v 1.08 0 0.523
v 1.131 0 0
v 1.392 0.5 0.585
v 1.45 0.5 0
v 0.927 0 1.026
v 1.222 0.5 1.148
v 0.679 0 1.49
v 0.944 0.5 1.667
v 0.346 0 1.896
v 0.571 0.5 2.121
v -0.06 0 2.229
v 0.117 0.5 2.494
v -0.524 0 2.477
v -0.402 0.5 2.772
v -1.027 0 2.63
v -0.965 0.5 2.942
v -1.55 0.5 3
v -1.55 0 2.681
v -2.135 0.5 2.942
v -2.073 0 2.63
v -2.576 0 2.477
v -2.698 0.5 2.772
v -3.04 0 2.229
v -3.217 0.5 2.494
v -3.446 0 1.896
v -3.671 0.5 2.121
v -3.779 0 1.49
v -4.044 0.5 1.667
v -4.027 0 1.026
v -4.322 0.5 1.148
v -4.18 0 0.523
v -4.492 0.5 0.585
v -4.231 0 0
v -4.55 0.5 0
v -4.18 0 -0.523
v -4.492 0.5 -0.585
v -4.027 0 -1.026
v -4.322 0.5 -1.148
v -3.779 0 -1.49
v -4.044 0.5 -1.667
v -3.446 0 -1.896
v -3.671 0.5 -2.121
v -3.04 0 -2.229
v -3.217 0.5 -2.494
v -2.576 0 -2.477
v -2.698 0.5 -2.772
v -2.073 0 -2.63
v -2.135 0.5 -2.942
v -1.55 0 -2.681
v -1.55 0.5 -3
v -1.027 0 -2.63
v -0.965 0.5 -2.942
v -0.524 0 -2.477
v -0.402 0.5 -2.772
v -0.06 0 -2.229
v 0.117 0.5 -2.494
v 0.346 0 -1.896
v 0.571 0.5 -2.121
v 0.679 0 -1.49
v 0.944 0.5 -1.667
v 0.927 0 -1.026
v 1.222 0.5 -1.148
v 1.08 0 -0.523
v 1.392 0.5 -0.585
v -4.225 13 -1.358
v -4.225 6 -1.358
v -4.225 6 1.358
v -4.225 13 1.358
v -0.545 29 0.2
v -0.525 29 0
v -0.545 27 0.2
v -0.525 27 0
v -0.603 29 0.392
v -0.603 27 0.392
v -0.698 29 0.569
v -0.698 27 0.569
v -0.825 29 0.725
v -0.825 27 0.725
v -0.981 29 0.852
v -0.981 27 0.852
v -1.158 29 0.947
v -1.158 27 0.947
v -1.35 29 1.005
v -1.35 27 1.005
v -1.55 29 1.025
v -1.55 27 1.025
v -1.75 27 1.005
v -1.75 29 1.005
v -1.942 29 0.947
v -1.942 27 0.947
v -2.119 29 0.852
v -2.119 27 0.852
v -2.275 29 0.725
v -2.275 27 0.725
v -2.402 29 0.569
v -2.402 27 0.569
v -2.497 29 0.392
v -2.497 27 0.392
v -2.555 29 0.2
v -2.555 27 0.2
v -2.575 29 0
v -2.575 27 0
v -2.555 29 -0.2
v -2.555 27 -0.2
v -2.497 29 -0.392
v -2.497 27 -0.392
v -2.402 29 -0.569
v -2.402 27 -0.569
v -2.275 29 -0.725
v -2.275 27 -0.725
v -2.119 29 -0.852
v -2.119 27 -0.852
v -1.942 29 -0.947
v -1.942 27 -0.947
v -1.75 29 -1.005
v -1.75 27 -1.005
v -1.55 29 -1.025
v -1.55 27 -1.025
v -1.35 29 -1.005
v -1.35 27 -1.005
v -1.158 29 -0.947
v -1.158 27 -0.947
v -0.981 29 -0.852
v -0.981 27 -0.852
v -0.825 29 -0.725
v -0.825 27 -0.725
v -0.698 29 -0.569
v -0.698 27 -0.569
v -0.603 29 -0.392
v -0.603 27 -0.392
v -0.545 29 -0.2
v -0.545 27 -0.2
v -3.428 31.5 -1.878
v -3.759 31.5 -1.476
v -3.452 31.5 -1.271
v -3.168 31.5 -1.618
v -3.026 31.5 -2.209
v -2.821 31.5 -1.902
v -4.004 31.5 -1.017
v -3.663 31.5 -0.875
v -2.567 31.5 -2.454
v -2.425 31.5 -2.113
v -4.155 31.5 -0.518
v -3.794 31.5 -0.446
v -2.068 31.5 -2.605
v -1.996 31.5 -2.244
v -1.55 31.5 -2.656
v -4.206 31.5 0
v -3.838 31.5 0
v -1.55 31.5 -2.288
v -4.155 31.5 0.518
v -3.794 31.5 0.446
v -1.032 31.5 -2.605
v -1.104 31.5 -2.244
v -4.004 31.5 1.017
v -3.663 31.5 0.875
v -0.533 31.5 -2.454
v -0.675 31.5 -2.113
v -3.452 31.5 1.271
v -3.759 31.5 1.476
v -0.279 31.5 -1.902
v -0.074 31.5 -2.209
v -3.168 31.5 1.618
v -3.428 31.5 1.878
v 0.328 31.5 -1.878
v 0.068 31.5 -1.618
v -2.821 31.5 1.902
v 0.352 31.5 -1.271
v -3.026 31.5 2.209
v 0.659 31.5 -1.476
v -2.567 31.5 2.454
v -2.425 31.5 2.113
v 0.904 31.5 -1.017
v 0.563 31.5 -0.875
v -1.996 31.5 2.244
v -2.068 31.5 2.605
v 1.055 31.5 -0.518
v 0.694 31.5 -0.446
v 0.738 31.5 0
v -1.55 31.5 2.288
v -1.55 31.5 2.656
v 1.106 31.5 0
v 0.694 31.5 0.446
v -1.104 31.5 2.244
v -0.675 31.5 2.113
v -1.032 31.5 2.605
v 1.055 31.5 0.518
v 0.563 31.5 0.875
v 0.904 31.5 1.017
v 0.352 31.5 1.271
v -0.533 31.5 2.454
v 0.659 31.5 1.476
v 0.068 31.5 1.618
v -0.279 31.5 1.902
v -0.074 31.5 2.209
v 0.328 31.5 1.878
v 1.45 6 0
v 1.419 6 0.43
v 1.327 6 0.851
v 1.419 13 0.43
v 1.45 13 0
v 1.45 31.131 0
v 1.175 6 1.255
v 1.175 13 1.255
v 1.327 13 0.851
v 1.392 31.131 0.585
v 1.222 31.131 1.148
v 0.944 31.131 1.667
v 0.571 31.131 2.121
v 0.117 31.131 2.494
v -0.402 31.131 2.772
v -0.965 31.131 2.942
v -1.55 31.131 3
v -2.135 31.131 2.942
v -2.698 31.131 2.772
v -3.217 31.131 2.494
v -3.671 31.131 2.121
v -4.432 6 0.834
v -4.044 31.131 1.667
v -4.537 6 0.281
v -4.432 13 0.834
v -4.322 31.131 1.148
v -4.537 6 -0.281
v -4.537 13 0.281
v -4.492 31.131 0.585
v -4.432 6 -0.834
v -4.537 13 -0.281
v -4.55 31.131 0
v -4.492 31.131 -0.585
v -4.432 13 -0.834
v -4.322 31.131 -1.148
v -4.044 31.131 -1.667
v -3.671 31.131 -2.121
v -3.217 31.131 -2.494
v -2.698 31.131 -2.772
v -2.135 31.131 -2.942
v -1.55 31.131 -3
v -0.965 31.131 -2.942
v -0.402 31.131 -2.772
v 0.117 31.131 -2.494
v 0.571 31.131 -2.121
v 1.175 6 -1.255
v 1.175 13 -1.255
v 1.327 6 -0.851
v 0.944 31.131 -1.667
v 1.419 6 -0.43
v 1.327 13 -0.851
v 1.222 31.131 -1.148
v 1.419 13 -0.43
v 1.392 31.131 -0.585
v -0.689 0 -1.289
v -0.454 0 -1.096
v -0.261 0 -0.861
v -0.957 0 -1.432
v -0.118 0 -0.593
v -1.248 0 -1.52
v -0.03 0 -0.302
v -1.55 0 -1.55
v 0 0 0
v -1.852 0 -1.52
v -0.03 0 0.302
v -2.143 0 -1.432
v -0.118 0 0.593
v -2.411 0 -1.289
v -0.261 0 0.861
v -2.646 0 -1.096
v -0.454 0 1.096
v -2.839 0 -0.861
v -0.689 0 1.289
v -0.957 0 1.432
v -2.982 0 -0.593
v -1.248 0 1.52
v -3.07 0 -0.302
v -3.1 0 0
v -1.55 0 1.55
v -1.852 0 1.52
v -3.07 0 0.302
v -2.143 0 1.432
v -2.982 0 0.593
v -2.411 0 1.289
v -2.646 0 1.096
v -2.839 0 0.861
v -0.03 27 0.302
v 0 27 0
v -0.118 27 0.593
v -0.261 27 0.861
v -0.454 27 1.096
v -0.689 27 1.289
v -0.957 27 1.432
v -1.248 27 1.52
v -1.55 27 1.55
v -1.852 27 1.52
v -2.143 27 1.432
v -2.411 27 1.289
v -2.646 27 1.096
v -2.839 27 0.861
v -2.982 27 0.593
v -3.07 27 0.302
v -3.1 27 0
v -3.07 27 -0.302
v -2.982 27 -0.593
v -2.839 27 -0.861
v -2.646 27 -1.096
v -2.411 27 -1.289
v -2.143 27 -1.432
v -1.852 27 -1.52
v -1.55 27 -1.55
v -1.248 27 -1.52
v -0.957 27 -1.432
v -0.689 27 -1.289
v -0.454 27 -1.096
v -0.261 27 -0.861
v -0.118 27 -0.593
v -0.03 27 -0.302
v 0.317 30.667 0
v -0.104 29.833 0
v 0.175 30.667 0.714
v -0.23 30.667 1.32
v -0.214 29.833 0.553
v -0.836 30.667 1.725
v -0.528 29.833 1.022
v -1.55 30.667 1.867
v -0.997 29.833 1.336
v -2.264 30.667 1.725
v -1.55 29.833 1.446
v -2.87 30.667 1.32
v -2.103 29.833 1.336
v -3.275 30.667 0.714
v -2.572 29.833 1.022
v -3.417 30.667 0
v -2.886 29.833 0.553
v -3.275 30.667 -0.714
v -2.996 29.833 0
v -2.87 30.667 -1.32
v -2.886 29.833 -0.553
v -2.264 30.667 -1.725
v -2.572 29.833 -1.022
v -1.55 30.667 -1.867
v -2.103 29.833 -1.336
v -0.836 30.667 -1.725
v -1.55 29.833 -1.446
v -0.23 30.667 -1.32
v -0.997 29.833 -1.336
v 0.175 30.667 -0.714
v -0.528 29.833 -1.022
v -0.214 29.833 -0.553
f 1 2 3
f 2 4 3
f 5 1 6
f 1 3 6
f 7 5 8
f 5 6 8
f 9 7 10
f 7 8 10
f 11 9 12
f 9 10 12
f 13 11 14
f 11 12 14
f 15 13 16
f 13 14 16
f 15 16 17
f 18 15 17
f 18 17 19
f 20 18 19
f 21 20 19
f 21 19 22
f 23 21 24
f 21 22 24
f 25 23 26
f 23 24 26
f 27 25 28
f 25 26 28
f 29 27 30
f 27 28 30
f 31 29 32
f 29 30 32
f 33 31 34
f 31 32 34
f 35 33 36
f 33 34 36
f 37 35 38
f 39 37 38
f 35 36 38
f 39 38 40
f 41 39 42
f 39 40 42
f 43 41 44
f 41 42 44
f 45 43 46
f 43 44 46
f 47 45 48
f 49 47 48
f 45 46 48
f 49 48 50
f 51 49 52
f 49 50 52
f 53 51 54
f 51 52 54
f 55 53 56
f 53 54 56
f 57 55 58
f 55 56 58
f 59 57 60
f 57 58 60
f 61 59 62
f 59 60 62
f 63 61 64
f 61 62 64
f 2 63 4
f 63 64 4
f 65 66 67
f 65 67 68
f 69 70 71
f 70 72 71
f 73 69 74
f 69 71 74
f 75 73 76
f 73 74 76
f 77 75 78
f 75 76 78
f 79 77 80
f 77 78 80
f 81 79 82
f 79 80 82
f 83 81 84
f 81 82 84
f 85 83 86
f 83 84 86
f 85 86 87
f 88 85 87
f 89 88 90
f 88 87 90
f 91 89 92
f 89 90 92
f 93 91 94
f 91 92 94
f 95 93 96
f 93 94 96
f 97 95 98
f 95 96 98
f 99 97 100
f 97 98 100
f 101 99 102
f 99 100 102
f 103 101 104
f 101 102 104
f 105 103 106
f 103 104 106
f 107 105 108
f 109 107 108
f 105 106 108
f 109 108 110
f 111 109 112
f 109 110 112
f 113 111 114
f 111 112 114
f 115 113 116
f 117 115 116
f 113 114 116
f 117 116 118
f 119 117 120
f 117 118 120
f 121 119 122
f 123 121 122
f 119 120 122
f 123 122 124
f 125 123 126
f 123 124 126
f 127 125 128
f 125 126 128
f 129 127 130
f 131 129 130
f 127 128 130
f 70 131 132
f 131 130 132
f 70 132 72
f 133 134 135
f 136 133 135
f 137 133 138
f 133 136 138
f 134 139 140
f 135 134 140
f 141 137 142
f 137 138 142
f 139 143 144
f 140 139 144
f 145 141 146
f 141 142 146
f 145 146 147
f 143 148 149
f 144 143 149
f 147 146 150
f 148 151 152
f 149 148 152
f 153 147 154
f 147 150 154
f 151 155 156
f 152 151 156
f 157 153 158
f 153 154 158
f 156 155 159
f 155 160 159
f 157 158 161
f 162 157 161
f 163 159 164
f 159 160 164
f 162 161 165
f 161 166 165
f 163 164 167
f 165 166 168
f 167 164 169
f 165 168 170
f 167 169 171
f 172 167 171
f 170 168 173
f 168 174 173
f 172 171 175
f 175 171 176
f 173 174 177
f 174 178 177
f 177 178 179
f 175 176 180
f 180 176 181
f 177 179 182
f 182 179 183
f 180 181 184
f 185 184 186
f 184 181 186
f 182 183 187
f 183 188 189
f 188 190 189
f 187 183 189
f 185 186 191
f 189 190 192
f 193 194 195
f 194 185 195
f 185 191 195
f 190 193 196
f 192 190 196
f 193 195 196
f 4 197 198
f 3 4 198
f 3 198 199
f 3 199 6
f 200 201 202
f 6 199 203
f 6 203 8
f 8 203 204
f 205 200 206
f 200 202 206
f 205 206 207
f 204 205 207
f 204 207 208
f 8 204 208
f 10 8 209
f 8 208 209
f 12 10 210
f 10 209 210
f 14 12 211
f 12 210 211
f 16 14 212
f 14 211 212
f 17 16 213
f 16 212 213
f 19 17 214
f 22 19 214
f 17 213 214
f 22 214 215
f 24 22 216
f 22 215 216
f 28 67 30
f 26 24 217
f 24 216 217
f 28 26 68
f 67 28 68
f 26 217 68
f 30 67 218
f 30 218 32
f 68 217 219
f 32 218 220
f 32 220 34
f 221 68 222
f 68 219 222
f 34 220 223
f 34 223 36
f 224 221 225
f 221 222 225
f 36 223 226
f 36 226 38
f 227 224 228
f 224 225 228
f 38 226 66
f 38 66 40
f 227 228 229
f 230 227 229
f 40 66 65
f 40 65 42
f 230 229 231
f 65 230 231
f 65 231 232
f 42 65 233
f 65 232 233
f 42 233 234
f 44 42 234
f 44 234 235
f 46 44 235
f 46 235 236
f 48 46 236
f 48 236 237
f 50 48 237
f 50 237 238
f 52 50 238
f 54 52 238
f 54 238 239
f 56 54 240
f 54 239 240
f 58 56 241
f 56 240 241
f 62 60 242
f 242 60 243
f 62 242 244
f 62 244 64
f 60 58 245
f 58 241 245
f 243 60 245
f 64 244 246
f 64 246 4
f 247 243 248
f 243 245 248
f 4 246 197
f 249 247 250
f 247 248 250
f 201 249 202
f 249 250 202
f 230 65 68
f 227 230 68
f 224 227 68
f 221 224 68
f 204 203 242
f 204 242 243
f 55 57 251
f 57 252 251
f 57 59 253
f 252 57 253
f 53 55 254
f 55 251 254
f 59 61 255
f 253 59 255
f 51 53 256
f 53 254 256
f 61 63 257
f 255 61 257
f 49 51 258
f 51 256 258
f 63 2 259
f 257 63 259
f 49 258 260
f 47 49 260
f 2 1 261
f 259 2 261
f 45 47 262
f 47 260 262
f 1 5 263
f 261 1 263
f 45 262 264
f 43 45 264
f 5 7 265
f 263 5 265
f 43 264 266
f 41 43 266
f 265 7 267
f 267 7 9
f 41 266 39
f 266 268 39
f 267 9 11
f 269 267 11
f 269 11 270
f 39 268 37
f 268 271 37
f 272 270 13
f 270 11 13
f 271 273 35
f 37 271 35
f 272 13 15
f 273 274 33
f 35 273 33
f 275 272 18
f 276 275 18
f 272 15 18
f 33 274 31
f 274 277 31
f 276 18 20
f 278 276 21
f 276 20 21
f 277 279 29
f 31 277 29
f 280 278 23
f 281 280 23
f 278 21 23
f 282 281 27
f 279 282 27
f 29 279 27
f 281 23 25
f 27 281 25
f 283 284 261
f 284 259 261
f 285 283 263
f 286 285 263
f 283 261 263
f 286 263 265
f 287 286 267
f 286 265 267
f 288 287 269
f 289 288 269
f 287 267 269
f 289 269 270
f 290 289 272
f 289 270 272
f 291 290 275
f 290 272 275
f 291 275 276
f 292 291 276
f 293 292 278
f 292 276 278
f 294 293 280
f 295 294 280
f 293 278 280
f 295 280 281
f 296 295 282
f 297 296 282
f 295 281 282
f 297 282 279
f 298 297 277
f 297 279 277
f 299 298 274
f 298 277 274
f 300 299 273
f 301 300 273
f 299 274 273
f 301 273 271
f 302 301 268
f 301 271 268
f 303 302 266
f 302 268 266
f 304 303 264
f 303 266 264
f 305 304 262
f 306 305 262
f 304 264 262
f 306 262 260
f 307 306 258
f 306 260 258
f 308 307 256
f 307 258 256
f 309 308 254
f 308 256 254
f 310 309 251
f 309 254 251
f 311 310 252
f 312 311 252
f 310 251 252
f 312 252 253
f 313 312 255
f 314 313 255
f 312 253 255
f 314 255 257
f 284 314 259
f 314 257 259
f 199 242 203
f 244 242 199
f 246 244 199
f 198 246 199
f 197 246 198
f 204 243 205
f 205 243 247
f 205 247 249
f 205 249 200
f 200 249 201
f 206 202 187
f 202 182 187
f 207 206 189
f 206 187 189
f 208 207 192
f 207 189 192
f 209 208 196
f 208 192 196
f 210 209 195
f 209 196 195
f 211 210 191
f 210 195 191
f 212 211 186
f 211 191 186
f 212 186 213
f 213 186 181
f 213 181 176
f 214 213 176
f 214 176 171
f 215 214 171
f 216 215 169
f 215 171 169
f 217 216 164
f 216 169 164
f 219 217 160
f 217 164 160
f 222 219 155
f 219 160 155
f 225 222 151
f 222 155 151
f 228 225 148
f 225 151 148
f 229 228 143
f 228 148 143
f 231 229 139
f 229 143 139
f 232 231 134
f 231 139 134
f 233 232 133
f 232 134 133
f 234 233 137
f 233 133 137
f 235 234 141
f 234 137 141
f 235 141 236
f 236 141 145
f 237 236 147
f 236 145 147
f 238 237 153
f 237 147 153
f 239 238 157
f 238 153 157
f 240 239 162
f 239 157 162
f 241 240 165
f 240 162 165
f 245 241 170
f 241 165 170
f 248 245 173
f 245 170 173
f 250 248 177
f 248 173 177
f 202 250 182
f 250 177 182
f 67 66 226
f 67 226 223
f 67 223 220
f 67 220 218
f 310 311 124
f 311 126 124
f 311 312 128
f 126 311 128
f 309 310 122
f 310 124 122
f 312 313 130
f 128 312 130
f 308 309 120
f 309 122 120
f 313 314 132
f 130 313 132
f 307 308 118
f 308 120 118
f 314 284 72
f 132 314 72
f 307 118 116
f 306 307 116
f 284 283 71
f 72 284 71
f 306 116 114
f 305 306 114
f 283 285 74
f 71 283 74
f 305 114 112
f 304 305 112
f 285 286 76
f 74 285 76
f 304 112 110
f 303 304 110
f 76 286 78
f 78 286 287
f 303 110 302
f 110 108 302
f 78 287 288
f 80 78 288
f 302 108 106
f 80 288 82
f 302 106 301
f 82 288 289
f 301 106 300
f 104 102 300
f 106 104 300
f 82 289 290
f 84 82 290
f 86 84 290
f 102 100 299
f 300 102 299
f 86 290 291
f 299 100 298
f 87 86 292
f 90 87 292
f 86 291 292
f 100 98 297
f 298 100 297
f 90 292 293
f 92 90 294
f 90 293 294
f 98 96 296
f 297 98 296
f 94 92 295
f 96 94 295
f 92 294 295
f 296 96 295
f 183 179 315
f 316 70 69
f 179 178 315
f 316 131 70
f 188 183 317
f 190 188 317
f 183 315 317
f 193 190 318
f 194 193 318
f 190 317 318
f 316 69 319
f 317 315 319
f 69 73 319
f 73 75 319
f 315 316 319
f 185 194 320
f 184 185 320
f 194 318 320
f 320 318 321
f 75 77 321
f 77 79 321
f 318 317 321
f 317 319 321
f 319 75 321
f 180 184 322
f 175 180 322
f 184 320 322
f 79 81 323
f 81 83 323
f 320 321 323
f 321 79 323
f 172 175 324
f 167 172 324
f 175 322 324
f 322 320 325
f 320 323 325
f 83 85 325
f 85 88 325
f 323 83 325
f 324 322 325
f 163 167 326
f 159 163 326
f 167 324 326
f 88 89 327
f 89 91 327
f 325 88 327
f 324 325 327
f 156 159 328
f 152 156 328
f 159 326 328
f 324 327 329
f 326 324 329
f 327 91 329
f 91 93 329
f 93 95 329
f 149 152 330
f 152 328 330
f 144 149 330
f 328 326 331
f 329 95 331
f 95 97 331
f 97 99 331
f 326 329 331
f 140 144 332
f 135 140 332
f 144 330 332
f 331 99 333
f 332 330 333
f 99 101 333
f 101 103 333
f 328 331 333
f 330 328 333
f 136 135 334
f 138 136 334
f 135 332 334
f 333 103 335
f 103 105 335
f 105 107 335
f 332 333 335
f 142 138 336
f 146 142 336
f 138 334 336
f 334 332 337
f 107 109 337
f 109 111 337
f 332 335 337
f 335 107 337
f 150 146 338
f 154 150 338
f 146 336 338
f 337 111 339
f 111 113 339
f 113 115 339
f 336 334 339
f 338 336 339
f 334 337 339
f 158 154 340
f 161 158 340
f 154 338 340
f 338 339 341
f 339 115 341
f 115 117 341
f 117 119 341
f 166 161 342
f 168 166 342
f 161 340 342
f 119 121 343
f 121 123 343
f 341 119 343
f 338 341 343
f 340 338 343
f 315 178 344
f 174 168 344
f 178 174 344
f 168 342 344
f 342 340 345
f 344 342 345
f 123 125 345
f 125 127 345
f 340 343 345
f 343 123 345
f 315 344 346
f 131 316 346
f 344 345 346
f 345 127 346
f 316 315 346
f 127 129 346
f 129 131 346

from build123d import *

# Parameters (mm, degrees)
SKETCH_2_W          = 0.406719167
SKETCH_2_H          = 7
CUT_EXTRUDE_1_DEPTH = 5


with BuildPart() as part:
    # 草图1 → 旋转1 (revolve)
    with BuildSketch(Plane.XY):
        Polygon((0, 0), (1.131136209, 0), (1.45, 0.5), (1.45, 31.13125), (1.10625, 31.5), (0.7375, 31.5), (-0.525, 29), (-0.525, 27), (0, 27), align=None)
    revolve(axis=Axis((-1.55, 0, 0), (0, -1, 0)))

    # 草图2 → 切除-拉伸1 (cut, symmetric)
    with BuildSketch(Plane.XY):
        with Locations((-4.428359584, 9.5)):
            Rectangle(SKETCH_2_W, SKETCH_2_H)
        with Locations((1.378359583, 9.5)):
            Rectangle(SKETCH_2_W, SKETCH_2_H)
    extrude(amount=CUT_EXTRUDE_1_DEPTH, both=True, mode=Mode.SUBTRACT)


solid = part.part
